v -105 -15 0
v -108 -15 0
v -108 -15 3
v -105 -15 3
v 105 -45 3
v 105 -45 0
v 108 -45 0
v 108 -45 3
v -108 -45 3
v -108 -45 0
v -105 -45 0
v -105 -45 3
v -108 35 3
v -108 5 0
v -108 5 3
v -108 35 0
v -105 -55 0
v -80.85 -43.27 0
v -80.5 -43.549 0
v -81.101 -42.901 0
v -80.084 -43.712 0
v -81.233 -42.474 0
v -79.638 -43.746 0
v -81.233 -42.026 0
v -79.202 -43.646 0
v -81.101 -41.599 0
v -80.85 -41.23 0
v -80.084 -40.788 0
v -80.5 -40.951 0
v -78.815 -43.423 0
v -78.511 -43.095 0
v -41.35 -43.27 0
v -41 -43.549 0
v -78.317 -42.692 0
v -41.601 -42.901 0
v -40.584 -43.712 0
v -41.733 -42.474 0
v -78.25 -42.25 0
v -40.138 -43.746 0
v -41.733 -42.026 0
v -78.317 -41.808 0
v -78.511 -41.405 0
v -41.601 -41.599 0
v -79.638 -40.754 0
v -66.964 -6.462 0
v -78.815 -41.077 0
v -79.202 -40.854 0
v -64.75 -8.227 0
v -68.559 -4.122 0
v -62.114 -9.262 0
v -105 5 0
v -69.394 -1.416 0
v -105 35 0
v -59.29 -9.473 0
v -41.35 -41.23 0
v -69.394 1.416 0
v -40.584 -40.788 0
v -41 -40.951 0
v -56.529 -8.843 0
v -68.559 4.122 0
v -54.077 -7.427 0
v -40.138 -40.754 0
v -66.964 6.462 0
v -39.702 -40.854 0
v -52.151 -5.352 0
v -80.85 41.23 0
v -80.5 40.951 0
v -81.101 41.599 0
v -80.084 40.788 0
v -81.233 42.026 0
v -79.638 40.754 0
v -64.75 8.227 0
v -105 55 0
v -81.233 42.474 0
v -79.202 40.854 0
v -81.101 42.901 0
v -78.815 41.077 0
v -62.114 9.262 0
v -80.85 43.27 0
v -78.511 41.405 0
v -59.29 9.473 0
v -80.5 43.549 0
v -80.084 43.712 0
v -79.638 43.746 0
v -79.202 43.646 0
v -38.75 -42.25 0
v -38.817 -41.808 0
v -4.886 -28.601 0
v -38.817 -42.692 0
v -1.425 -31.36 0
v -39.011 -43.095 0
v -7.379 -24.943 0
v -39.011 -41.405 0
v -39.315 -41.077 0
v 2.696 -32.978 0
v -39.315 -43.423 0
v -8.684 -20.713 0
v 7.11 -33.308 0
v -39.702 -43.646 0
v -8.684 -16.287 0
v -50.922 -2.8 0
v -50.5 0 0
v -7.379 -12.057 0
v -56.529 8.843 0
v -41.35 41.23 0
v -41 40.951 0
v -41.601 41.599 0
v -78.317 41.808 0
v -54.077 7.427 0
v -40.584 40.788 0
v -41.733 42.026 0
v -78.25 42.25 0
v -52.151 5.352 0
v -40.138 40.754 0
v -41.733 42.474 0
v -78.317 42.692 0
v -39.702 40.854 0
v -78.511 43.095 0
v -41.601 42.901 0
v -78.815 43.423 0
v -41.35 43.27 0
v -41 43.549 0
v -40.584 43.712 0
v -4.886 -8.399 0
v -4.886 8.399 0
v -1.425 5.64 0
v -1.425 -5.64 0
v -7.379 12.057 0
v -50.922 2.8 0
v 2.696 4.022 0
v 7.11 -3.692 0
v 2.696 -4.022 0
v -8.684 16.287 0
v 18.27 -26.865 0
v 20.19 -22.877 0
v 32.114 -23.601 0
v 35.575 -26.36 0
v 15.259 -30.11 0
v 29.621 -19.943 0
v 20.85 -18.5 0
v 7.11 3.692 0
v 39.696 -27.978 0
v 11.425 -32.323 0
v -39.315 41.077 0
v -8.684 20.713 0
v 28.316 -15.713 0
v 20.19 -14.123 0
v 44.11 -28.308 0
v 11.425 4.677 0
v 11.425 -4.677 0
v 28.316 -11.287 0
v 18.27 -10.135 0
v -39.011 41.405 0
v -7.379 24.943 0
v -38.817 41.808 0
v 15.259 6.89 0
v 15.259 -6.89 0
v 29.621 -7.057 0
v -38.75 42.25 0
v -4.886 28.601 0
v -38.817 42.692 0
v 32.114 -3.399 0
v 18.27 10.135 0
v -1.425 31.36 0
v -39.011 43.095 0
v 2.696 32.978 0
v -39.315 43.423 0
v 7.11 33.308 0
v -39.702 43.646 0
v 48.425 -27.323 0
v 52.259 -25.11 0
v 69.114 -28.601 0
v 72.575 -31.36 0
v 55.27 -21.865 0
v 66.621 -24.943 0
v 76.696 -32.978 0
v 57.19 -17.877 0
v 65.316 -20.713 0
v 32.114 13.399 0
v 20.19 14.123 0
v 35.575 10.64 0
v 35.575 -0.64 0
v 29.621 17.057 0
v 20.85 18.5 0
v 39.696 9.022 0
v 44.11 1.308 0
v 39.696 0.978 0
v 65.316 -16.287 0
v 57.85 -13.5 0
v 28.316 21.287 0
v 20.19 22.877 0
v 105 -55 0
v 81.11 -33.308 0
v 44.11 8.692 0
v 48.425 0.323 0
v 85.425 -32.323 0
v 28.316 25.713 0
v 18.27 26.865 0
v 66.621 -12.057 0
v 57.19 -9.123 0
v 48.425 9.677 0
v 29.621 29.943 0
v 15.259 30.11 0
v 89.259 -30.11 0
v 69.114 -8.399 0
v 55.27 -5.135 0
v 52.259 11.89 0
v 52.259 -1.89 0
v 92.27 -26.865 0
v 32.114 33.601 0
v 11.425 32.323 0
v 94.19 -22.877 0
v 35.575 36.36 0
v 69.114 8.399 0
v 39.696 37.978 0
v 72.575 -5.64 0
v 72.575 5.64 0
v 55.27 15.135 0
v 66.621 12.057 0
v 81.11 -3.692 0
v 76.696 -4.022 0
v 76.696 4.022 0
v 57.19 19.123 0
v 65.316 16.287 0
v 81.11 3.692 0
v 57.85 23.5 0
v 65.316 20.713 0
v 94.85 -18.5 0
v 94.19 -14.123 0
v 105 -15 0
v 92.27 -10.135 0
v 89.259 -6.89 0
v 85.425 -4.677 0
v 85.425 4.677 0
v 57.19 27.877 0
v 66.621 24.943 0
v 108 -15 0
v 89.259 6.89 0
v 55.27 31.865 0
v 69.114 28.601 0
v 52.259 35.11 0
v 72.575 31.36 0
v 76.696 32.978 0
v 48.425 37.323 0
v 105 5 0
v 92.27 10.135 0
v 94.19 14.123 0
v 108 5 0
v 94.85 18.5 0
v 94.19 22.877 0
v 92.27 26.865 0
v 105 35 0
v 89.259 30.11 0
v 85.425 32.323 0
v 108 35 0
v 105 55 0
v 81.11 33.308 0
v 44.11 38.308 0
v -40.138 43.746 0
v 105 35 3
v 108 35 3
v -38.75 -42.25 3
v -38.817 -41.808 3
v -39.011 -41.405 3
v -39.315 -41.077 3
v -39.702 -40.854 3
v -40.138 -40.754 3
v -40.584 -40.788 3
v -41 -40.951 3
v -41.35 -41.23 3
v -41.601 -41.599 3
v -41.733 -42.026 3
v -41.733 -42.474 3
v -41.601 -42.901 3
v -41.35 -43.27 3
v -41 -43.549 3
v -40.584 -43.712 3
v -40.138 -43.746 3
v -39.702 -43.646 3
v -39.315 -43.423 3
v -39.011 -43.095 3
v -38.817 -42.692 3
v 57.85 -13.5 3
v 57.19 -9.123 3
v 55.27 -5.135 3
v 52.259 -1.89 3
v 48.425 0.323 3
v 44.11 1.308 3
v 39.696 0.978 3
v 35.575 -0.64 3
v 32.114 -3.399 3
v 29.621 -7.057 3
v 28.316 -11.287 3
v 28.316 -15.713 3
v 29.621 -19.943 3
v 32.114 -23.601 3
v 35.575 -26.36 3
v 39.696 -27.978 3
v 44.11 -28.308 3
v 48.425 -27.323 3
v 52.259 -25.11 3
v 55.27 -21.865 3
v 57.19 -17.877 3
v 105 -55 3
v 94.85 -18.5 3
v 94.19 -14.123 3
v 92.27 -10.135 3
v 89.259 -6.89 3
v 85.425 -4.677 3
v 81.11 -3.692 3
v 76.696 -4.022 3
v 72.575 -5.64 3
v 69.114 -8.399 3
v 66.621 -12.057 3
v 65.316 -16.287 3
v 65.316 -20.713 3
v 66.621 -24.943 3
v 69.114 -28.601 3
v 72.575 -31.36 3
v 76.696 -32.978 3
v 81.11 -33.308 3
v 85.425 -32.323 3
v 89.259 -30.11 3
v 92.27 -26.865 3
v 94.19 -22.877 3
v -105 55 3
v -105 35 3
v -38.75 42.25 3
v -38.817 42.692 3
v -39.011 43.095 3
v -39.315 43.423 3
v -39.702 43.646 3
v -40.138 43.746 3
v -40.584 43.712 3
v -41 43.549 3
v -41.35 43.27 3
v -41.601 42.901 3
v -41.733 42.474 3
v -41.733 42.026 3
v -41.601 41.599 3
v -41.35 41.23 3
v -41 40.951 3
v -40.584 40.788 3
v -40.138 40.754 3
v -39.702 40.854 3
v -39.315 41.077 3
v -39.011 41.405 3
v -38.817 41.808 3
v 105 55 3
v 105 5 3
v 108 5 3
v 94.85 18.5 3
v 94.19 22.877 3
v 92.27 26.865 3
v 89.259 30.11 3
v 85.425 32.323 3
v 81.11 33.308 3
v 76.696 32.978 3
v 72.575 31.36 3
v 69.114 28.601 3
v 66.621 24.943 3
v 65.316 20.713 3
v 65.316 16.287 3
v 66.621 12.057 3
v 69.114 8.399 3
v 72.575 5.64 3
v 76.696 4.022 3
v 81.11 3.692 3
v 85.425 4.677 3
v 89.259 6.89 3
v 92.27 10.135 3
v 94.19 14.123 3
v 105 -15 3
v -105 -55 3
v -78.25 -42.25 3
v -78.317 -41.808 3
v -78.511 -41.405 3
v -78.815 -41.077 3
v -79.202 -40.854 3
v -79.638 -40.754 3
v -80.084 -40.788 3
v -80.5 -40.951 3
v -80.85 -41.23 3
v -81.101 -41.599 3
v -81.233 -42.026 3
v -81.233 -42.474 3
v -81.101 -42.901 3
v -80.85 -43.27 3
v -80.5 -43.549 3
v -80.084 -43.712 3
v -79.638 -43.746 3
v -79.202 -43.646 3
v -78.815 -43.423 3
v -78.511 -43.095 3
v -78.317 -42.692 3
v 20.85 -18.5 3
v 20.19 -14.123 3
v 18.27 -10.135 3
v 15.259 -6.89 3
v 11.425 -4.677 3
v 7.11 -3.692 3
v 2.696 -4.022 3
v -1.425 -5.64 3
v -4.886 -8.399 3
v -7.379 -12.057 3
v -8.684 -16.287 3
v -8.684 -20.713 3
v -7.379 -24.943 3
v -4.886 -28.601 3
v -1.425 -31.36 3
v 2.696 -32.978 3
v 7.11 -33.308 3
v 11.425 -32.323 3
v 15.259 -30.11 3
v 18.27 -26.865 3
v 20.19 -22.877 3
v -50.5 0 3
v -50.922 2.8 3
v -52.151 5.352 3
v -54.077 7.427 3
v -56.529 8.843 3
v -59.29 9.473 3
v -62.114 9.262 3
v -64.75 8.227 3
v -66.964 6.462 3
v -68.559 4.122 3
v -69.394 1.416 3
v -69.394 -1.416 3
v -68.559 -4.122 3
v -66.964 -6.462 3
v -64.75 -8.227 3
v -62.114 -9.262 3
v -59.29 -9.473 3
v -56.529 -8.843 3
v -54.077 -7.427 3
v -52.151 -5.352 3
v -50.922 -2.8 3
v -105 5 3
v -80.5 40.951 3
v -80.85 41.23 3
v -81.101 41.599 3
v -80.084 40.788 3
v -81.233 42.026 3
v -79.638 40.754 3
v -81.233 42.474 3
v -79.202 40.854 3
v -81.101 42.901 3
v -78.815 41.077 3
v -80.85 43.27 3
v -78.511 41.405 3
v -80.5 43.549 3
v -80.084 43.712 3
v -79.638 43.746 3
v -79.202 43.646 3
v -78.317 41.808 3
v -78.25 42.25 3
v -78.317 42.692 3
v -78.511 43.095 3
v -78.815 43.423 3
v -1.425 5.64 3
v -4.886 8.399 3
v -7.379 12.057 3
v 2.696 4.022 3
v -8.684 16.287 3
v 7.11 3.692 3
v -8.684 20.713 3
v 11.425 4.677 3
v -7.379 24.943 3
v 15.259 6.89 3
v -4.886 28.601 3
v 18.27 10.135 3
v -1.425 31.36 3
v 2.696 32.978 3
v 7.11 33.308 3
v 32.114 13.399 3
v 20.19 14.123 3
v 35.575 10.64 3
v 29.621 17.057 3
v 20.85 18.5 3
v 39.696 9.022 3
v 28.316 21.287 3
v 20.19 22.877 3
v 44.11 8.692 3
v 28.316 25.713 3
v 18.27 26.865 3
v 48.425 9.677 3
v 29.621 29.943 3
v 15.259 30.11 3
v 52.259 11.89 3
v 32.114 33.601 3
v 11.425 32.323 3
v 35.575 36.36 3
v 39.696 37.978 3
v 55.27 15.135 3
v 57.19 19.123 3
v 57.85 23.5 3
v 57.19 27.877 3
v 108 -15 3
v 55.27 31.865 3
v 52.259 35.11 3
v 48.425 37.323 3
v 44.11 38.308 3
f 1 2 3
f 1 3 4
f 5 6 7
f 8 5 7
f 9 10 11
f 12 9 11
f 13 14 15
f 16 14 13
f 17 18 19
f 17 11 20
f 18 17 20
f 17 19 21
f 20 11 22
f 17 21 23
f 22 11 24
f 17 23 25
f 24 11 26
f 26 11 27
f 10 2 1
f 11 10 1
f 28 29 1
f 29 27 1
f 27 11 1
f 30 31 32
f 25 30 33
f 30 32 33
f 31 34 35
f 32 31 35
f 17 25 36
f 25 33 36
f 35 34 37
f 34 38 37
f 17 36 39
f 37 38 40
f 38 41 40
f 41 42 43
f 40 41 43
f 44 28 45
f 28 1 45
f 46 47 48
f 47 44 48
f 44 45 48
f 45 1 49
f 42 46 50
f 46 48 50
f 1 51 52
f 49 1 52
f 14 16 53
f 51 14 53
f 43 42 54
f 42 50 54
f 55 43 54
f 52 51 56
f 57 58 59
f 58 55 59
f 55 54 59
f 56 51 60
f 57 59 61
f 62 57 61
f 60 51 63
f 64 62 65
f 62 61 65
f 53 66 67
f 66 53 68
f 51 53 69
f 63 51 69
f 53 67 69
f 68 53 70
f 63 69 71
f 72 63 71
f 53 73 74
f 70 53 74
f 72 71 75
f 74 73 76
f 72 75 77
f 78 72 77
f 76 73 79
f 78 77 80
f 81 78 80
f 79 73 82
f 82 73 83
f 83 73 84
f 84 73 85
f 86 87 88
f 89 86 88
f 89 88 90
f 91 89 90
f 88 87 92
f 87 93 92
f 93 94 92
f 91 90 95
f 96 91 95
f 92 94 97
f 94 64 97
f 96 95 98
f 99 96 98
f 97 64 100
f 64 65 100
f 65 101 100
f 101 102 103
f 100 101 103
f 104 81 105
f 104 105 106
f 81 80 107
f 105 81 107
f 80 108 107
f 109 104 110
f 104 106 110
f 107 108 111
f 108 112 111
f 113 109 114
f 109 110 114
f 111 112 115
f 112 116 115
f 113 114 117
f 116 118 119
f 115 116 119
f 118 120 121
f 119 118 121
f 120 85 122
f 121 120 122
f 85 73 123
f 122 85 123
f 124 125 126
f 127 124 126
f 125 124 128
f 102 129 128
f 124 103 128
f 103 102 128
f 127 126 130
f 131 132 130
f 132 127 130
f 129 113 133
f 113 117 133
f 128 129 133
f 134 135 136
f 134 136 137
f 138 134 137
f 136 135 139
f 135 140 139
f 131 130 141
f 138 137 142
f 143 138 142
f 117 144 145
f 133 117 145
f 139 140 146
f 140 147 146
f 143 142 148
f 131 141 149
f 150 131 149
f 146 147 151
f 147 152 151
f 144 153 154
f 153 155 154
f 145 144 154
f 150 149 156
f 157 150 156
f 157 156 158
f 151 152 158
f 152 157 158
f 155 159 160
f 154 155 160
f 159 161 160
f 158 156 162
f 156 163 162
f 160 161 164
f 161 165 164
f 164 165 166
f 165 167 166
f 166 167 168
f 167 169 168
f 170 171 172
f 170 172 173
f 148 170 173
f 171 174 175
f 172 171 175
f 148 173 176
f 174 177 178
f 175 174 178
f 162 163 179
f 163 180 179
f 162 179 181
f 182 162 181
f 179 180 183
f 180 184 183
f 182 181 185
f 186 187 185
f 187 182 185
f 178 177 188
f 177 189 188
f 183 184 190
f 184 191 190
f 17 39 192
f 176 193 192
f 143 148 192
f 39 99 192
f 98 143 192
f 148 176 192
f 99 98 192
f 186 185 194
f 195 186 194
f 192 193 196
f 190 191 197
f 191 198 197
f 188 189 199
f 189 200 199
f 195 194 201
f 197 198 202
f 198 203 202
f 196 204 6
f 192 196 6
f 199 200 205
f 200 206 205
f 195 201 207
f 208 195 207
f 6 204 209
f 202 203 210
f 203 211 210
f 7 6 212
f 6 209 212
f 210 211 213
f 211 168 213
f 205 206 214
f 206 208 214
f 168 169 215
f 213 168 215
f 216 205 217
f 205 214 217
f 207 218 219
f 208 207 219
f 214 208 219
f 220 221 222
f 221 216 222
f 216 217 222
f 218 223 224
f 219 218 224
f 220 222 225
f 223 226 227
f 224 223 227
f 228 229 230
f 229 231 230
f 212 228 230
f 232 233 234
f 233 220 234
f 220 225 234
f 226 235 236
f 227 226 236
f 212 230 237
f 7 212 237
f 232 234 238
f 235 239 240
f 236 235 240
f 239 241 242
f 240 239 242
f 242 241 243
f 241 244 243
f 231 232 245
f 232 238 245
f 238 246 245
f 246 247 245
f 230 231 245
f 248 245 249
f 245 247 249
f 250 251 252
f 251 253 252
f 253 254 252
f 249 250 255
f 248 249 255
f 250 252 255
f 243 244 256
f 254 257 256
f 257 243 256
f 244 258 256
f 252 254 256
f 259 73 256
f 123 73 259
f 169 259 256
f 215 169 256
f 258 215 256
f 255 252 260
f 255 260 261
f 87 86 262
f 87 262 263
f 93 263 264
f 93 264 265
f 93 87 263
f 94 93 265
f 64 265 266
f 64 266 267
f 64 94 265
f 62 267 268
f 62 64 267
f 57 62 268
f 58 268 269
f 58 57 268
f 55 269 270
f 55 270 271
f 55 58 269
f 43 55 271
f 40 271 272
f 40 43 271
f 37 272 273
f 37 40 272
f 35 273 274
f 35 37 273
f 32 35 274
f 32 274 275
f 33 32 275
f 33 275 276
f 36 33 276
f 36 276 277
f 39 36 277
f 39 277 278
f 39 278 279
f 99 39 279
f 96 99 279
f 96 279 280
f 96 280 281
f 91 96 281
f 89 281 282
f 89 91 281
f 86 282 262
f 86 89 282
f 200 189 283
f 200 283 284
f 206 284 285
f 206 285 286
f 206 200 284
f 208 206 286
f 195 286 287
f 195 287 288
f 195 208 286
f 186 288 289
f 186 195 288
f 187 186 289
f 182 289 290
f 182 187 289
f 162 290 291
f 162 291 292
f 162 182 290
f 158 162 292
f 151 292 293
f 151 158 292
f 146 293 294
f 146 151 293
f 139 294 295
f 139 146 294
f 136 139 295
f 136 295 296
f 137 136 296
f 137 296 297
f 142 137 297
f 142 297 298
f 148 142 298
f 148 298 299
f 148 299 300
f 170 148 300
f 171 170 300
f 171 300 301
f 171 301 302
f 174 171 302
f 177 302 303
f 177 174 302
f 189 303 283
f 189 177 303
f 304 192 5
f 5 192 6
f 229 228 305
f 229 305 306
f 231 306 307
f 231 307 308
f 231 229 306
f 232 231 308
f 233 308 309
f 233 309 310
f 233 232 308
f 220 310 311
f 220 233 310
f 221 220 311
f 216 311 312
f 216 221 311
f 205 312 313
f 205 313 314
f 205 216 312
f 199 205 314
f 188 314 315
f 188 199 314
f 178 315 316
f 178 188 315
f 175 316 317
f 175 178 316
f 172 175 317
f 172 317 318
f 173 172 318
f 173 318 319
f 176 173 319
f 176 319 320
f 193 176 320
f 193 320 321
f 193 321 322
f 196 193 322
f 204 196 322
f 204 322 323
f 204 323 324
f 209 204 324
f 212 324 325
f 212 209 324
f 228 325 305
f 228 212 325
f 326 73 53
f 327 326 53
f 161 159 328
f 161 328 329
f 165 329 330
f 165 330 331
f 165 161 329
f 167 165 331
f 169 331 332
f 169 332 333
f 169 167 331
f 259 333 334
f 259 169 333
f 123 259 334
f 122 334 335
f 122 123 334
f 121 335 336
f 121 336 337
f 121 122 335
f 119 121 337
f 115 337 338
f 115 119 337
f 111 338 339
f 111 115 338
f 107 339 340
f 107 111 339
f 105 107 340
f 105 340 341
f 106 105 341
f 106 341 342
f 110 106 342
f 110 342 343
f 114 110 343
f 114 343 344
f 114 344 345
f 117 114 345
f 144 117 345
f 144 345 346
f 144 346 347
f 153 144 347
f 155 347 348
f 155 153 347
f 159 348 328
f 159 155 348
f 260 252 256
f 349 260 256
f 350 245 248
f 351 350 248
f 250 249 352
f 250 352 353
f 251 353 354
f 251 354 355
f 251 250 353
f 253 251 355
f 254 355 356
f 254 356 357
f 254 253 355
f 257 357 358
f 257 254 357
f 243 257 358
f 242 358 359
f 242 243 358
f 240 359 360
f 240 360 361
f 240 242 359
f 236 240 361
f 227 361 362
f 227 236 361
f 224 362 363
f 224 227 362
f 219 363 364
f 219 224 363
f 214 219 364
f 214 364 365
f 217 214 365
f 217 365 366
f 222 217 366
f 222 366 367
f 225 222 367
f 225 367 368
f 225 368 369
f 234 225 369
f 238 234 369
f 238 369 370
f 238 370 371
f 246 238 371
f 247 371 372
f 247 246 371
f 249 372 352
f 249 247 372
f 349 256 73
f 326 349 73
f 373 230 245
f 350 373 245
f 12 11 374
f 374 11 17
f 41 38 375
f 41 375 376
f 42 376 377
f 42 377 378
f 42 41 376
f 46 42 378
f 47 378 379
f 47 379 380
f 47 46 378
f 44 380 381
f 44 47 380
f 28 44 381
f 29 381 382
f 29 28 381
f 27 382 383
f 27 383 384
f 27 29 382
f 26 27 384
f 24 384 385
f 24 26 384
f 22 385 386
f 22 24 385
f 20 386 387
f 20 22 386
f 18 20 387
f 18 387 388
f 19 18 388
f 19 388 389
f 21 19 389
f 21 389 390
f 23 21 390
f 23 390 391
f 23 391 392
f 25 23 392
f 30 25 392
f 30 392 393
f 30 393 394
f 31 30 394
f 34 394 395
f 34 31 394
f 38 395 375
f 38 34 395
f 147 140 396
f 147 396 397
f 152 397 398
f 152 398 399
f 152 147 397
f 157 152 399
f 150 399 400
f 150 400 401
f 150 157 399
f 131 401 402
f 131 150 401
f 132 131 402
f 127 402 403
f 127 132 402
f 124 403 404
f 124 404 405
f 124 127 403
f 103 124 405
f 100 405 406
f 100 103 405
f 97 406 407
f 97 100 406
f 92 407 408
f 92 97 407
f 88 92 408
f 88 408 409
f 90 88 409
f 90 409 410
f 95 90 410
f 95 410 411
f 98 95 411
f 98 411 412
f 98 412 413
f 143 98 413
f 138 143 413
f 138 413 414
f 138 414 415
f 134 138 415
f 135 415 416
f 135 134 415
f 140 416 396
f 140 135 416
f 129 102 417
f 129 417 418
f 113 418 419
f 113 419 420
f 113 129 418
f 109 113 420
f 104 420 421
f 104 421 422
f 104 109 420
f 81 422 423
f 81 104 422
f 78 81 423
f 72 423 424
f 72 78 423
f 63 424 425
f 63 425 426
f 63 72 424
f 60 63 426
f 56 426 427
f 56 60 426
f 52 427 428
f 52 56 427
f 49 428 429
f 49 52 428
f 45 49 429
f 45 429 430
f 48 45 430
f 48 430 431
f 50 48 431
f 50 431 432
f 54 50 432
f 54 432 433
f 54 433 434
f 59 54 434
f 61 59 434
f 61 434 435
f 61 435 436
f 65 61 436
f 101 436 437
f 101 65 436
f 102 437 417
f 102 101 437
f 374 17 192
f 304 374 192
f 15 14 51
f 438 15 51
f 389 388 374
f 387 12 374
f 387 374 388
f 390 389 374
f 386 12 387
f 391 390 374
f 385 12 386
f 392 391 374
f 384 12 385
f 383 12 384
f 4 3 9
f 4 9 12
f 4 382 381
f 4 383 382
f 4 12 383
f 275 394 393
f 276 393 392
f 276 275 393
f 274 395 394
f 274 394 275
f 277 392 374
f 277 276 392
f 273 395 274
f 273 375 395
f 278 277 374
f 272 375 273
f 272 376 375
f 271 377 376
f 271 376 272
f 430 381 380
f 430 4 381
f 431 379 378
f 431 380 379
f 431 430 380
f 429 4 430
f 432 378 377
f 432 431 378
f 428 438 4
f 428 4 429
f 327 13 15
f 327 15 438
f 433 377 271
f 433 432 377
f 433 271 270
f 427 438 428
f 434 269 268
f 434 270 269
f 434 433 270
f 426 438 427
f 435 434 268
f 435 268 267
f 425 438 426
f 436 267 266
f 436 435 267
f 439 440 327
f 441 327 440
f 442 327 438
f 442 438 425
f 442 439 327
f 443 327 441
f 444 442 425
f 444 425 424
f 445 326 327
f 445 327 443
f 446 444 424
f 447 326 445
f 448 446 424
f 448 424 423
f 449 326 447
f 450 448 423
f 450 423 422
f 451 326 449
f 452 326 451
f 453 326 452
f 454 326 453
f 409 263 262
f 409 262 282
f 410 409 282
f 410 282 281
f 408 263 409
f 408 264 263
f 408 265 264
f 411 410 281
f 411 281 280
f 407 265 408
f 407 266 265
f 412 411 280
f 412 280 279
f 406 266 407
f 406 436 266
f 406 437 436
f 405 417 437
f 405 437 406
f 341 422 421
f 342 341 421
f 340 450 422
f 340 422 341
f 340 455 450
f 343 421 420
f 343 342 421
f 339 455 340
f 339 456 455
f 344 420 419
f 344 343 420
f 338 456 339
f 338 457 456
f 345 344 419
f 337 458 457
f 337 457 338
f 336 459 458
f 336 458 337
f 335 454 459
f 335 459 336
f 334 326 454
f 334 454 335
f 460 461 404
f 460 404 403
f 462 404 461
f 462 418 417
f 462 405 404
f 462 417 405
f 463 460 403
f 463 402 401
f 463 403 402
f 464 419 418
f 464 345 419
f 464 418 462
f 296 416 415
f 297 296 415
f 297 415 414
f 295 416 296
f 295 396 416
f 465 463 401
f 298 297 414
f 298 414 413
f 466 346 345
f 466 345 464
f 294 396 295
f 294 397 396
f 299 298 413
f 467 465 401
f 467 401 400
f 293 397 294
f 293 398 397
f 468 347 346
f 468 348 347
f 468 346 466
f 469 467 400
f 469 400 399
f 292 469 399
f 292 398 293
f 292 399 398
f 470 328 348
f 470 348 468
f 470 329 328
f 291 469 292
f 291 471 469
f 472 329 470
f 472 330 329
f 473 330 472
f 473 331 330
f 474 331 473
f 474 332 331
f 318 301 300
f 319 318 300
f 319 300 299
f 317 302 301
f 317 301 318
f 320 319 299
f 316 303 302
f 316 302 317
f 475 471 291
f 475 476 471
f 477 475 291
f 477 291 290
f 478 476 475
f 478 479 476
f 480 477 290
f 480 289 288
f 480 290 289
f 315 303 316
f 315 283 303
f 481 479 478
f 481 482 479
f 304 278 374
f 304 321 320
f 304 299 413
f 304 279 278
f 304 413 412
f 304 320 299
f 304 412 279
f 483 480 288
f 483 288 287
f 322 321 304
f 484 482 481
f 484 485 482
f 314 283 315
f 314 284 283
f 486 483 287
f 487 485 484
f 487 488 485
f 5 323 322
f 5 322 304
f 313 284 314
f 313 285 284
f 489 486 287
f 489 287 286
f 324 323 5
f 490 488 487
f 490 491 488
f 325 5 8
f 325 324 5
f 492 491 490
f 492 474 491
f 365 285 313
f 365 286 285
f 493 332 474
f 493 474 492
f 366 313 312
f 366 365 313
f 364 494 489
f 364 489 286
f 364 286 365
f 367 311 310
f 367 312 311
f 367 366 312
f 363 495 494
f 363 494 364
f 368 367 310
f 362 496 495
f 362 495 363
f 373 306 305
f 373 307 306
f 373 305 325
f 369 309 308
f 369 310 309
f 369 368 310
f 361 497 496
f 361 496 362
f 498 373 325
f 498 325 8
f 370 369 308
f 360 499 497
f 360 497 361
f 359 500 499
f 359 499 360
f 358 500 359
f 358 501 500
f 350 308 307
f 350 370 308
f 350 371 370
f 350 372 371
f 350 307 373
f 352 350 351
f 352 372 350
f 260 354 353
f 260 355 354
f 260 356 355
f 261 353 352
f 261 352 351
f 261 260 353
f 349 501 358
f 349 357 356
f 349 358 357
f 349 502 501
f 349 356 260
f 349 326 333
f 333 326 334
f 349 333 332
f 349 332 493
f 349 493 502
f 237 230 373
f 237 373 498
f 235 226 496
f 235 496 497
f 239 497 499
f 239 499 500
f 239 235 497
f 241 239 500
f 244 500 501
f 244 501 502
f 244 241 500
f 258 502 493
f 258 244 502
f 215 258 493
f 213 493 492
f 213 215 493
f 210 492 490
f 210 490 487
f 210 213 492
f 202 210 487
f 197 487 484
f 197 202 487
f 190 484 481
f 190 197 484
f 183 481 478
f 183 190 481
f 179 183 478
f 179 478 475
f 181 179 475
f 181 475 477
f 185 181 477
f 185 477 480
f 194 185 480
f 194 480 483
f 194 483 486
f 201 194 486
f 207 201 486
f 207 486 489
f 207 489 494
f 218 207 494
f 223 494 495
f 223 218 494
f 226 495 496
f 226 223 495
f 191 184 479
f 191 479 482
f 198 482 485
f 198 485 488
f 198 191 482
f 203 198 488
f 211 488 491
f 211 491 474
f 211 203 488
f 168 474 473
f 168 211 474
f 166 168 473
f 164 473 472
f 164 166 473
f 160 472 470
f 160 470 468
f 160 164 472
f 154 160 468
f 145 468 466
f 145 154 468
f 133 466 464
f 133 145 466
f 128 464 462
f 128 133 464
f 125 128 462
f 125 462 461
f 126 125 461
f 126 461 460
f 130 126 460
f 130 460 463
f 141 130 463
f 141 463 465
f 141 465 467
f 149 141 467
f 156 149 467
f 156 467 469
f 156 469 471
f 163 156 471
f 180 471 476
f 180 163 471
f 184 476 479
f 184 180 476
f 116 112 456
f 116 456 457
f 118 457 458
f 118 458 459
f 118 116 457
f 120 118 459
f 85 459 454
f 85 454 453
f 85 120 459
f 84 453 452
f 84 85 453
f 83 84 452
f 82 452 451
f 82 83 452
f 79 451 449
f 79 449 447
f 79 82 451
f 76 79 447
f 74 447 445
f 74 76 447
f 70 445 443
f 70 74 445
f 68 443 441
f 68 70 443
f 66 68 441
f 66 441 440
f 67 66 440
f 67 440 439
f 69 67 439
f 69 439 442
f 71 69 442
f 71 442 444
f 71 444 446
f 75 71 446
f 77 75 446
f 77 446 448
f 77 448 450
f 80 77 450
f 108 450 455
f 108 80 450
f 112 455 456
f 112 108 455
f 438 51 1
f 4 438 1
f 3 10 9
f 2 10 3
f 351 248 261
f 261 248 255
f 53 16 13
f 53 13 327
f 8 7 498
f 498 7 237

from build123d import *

# Parameters (mm, degrees)
F0_R     = 1.5
F0_R_2   = 14.85
F0_R_3   = 9.5
F0_W     = 3
F0_H     = 30
F1_DEPTH = 3


with BuildPart() as f1:
    # F0 (on Top) → F1 (new body)
    with BuildSketch(Plane.XY):
        Polygon((105, 55), (-105, 55), (-105, 35), (-105, 5), (-105, -15), (-105, -45), (-105, -55), (105, -55), (105, -45), (105, -15), (105, 5), (105, 35), align=None)
        with Locations((-79.75, -42.25)):
            Circle(F0_R, mode=Mode.SUBTRACT)
        with Locations((-40.25, -42.25)):
            Circle(F0_R, mode=Mode.SUBTRACT)
        with Locations((6, -18.5)):
            Circle(F0_R_2, mode=Mode.SUBTRACT)
        with Locations((43, -13.5)):
            Circle(F0_R_2, mode=Mode.SUBTRACT)
        with Locations((80, -18.5)):
            Circle(F0_R_2, mode=Mode.SUBTRACT)
        with Locations((-60, 0)):
            Circle(F0_R_3, mode=Mode.SUBTRACT)
        with Locations((-79.75, 42.25)):
            Circle(F0_R, mode=Mode.SUBTRACT)
        with Locations((-40.25, 42.25)):
            Circle(F0_R, mode=Mode.SUBTRACT)
        with Locations((6, 18.5)):
            Circle(F0_R_2, mode=Mode.SUBTRACT)
        with Locations((43, 23.5)):
            Circle(F0_R_2, mode=Mode.SUBTRACT)
        with Locations((80, 18.5)):
            Circle(F0_R_2, mode=Mode.SUBTRACT)
        with Locations((-106.5, 20)):
            Rectangle(F0_W, F0_H)
        with Locations((106.5, 20)):
            Rectangle(F0_W, F0_H)
        with Locations((-106.5, -30)):
            Rectangle(F0_W, F0_H)
        with Locations((106.5, -30)):
            Rectangle(F0_W, F0_H)
    extrude(amount=F1_DEPTH)


solid = f1.part
